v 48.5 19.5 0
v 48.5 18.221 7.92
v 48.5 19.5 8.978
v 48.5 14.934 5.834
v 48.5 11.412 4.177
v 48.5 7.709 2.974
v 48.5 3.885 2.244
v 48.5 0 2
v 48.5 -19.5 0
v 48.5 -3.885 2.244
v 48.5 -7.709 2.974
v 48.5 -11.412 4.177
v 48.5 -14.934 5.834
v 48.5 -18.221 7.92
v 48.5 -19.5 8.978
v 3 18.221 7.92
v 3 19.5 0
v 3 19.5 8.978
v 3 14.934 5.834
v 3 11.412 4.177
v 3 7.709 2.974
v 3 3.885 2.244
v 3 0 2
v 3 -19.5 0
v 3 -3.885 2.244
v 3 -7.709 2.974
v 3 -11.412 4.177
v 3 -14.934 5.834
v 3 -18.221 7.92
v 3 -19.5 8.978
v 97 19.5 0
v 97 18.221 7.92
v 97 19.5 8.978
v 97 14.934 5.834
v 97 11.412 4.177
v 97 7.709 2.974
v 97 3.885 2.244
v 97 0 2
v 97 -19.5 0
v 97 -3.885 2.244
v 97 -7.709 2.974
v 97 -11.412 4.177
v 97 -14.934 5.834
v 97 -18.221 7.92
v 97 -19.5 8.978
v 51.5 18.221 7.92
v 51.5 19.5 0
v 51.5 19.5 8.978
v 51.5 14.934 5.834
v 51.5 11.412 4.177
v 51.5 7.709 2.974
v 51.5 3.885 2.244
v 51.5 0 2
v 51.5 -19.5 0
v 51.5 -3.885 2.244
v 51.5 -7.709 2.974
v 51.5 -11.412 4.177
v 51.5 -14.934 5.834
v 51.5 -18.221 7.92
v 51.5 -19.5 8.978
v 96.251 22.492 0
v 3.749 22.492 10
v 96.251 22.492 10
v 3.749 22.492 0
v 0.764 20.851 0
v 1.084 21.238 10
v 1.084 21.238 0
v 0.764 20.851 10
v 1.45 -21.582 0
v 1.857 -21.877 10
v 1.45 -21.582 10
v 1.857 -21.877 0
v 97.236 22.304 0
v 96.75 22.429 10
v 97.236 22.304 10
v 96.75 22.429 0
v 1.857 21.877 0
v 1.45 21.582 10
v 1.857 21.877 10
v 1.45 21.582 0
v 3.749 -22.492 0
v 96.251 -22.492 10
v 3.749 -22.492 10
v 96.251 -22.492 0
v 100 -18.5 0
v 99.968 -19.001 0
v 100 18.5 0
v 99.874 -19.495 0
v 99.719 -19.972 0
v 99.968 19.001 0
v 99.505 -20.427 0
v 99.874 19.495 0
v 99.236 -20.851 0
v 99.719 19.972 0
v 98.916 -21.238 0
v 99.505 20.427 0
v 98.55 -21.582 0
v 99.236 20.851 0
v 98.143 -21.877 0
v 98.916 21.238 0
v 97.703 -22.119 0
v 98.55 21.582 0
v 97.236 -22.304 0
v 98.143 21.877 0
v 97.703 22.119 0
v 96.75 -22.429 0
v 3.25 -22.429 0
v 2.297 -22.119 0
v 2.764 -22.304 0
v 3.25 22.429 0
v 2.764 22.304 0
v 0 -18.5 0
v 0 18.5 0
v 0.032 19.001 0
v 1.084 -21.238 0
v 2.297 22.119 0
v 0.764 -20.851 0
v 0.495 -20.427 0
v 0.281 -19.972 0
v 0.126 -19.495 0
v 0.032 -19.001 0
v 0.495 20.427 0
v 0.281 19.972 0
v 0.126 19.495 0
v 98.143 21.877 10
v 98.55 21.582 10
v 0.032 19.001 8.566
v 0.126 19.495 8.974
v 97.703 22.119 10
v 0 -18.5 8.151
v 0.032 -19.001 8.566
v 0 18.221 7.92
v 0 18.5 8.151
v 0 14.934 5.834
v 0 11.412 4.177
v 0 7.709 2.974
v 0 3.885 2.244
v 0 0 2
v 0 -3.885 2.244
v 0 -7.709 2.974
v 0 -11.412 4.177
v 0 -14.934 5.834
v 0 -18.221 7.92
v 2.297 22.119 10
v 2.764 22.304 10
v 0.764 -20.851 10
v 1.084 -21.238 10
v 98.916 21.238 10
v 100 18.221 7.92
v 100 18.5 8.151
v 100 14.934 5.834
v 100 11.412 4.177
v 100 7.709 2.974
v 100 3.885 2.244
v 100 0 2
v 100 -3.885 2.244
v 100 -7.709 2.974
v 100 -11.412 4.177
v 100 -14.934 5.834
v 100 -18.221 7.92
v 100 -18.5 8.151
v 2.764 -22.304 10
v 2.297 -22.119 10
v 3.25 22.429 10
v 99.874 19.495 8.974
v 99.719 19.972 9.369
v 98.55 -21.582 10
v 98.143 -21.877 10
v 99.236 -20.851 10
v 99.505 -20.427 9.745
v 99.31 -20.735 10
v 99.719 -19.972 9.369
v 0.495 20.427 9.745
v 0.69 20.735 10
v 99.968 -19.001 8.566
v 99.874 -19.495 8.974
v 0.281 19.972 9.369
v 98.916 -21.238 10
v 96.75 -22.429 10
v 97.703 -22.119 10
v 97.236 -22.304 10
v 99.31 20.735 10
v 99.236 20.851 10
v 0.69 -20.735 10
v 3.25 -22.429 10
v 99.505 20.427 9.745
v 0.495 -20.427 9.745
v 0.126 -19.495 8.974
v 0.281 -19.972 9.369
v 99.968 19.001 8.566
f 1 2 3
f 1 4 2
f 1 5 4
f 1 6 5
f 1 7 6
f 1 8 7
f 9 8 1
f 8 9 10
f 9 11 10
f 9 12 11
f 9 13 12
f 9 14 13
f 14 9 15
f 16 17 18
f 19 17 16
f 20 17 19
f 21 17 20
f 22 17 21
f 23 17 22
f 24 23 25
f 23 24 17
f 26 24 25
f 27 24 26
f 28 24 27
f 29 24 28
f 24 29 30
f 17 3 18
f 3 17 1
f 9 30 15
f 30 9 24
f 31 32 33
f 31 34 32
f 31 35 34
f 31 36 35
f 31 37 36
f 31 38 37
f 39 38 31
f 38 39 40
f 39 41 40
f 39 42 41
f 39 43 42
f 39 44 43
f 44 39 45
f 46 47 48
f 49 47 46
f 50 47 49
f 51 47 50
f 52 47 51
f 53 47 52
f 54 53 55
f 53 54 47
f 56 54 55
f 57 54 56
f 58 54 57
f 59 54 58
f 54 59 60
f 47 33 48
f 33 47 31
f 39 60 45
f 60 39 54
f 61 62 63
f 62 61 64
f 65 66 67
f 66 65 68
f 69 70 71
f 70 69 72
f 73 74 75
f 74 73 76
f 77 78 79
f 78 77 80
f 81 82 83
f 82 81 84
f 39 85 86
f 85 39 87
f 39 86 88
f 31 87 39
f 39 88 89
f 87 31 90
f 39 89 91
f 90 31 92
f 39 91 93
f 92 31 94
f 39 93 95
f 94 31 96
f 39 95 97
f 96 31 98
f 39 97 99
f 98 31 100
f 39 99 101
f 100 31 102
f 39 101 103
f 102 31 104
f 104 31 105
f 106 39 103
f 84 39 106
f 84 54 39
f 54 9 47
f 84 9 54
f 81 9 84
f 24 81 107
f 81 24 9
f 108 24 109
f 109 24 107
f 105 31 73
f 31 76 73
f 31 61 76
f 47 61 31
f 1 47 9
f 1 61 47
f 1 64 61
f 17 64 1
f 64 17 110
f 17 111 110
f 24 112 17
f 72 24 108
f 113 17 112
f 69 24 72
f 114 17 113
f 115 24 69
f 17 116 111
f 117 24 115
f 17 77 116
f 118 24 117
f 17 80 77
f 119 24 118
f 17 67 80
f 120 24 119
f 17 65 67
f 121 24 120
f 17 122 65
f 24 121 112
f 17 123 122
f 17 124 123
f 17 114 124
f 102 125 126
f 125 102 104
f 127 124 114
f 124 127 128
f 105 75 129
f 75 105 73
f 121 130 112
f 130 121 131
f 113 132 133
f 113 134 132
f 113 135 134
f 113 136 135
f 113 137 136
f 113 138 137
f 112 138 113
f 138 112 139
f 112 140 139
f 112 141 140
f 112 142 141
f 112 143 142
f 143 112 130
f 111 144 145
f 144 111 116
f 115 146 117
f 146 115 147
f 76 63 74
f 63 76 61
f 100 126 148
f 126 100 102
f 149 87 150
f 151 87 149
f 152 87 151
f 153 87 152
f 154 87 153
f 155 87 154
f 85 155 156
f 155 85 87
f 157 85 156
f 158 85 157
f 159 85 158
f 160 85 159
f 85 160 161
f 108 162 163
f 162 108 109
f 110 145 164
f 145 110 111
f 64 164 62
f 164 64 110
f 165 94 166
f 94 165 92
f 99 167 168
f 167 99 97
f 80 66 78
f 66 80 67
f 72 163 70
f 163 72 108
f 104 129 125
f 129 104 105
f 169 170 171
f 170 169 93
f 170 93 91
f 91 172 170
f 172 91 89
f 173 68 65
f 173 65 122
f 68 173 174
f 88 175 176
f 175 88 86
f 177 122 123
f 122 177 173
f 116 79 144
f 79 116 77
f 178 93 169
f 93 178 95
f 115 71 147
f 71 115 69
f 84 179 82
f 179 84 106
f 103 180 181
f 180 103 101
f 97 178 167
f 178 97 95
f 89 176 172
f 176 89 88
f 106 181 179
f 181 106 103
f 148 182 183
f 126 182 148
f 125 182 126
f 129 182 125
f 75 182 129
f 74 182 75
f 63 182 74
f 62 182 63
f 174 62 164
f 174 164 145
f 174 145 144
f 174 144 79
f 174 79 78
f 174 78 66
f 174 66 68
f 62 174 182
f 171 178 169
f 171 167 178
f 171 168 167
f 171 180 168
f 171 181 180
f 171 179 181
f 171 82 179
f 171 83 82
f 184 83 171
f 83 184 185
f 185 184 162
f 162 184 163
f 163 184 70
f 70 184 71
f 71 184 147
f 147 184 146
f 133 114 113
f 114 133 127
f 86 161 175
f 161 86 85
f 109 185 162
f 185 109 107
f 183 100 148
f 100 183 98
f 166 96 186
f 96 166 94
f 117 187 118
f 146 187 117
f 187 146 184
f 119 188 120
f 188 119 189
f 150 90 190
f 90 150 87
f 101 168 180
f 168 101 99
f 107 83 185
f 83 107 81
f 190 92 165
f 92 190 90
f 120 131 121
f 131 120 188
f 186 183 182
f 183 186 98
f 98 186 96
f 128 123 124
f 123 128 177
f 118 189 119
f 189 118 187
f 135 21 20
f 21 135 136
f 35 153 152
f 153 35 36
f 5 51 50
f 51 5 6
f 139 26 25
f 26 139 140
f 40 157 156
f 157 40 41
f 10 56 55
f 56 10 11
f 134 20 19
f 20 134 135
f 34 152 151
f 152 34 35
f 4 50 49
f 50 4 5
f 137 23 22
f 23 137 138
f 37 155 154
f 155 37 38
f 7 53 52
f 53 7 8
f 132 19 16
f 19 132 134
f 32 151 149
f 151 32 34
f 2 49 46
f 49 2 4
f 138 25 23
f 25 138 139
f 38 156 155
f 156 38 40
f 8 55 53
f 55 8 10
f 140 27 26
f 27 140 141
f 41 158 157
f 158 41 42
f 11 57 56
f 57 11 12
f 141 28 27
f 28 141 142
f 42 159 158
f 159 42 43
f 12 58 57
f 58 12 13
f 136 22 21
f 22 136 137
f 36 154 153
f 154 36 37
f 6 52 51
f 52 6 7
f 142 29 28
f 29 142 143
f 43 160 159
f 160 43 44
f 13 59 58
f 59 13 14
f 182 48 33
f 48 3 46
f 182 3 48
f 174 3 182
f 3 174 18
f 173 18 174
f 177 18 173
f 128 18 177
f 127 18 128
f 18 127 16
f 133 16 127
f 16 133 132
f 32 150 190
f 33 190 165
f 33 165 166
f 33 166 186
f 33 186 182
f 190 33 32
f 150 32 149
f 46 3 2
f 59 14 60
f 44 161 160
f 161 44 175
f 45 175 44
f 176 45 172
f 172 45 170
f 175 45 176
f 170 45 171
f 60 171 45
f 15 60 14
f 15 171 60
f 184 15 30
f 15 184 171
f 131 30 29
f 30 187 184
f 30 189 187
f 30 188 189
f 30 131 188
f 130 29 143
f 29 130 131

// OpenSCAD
// -----------------------------------------------------
// SodaStream-Patronen-Lager
//  ....damit eine leere, auf Austausch wartende Patrone
//      dann nicht doch irgendwann mal runterrollt und
//      die Fliesen zerdeppert.
//
//  Detlev Ahlgrimm, 07.2018
// -----------------------------------------------------

co2cylinder_diameter=60;  // [10:200]
diameter_backlash=2;      // [0:5]
width=45;                 // [10:200]
length=100;               // [10:200]
height=10;                // [5:50]
wall_strength=3;          // [1:10]
bottom_thickness=2;       // [1:10]
r=4;                      // [1:10]

$fn=50;

difference() {
  hull() {
    translate([       r, -width/2+r, 0]) cylinder(r=r, h=height);
    translate([length-r, -width/2+r, 0]) cylinder(r=r, h=height);
    translate([       r,  width/2-r, 0]) cylinder(r=r, h=height);
    translate([length-r,  width/2-r, 0]) cylinder(r=r, h=height);
  }
  translate([-1, 0, (co2cylinder_diameter+diameter_backlash)/2+bottom_thickness]) rotate([0, 90, 0]) cylinder(d=co2cylinder_diameter+diameter_backlash, h=length+2);

  for(x=[wall_strength, (length+wall_strength)/2]) {
    translate([x, -(width-2*wall_strength)/2, -1]) cube([(length-3*wall_strength)/2, width-2*wall_strength, height+2]);
  }
}
